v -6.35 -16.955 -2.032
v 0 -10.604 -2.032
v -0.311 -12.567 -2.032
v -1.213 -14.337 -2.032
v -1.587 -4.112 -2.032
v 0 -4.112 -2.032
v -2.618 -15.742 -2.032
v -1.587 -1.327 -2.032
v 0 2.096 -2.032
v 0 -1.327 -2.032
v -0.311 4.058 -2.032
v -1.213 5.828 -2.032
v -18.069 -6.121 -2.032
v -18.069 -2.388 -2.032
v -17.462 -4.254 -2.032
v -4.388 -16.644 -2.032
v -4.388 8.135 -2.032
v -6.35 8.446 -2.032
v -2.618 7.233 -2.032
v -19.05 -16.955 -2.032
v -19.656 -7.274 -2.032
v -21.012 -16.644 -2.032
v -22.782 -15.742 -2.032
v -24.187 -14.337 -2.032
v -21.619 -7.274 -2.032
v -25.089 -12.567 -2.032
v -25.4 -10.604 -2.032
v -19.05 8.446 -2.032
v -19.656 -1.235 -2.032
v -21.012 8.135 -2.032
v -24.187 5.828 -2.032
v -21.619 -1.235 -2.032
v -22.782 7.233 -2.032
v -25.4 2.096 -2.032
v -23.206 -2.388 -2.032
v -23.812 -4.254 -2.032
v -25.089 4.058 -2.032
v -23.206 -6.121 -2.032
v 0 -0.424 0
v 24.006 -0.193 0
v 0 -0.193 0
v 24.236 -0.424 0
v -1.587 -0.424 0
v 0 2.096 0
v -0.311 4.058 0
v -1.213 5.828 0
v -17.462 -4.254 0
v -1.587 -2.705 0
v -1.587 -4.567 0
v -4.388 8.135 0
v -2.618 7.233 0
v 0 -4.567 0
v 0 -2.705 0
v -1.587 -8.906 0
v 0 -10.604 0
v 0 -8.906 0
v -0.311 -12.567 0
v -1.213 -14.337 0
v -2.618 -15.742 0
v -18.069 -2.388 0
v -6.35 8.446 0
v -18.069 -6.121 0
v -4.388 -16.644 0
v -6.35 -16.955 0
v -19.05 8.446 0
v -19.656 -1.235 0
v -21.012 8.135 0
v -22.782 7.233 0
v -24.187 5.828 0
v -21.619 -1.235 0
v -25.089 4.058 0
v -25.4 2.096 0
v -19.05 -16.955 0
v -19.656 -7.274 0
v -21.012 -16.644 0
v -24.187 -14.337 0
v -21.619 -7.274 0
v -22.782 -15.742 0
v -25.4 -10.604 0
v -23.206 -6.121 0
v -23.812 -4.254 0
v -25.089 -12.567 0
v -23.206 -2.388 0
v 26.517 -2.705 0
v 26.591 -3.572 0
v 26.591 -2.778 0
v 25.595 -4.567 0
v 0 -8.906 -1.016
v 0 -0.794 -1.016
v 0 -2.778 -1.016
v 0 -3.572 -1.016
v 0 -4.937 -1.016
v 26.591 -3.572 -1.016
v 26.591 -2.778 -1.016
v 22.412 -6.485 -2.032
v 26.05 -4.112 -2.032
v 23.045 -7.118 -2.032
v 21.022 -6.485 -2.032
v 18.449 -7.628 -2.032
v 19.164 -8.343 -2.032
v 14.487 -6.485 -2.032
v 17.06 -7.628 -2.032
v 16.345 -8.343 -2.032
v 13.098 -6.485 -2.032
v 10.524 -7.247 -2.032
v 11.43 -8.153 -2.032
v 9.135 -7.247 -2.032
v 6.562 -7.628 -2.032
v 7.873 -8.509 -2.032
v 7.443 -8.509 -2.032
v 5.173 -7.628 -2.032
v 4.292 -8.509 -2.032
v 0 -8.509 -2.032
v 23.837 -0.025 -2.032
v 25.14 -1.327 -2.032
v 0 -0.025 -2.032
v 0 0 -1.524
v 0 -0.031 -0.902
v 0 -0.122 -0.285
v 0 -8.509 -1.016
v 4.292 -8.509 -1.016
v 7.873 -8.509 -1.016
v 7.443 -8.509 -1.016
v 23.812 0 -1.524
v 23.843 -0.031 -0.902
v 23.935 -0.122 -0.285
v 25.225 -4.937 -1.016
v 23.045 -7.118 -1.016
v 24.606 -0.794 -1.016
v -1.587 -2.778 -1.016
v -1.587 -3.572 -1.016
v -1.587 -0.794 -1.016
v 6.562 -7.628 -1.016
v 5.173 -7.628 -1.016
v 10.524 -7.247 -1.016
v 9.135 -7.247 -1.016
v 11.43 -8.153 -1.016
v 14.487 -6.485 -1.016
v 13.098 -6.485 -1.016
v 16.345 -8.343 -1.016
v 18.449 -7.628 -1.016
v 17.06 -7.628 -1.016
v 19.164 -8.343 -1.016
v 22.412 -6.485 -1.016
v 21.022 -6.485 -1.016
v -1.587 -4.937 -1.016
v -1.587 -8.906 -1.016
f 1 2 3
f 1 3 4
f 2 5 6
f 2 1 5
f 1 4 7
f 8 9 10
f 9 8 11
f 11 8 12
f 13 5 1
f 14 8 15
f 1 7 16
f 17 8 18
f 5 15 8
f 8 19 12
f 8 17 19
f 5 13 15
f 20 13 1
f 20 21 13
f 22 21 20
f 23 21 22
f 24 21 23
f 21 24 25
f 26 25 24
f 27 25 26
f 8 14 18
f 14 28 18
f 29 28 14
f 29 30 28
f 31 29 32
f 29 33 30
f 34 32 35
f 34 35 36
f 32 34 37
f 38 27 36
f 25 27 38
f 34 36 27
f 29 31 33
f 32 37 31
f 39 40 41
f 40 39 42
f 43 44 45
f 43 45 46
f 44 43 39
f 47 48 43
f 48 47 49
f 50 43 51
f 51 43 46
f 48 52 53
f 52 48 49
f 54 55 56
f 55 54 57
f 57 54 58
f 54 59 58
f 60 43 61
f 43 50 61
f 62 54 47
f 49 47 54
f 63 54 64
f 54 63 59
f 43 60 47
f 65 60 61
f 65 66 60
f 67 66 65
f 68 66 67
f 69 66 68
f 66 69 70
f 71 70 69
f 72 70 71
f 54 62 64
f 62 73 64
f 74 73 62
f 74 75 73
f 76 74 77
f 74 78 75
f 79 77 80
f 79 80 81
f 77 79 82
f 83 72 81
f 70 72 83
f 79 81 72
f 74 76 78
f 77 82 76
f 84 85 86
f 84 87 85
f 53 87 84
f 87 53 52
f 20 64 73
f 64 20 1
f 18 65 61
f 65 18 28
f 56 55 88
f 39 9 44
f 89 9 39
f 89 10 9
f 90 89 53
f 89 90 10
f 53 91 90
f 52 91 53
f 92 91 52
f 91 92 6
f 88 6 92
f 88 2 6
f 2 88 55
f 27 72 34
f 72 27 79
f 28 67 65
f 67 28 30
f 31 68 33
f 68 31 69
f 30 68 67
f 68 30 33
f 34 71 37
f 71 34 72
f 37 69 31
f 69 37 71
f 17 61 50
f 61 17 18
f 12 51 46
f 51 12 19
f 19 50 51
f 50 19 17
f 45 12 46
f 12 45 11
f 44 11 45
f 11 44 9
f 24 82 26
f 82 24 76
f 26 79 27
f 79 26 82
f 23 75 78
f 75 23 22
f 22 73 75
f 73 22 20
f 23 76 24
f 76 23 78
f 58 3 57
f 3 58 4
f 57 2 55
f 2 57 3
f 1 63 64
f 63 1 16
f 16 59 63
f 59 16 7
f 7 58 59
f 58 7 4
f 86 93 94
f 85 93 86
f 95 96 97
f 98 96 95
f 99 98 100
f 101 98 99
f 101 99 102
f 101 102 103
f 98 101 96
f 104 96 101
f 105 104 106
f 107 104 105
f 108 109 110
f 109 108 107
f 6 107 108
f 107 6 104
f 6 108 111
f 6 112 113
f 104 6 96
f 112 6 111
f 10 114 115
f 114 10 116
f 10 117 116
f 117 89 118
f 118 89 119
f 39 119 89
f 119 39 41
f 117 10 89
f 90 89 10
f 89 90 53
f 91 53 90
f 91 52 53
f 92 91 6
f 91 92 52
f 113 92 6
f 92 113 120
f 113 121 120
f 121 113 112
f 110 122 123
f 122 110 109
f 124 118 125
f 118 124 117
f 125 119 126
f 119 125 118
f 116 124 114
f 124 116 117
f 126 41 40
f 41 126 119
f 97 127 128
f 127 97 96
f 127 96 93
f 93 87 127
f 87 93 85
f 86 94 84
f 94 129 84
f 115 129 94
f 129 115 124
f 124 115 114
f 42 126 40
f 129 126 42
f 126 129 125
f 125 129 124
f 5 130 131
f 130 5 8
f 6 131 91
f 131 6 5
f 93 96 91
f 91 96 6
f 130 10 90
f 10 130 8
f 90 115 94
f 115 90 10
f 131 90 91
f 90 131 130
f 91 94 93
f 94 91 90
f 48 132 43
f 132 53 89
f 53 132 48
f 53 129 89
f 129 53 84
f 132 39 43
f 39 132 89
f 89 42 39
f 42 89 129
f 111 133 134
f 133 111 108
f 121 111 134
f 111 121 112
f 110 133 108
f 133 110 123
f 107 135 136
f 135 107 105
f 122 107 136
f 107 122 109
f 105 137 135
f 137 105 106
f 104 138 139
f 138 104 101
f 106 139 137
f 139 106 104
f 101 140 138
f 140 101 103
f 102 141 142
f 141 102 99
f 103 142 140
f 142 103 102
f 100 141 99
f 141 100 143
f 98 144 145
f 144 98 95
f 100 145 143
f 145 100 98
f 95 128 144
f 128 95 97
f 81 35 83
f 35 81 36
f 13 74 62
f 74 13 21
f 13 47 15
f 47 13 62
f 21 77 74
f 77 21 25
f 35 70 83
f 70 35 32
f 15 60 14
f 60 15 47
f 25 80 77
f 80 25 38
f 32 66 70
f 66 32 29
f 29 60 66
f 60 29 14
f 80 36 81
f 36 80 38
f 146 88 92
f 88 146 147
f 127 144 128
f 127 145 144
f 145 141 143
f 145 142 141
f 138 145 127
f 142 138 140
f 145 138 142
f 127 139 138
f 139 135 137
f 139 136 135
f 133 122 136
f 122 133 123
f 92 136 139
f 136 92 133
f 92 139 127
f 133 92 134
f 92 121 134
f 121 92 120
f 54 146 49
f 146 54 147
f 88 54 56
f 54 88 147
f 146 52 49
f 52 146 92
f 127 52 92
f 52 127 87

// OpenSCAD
// Physical Keygen - by Nirav Patel <http://eclecti.cc>
//
// Generate a duplicate of a Schlage SC1 key by editing the last line of the file
// and entering in the key code of the lock.  If you don't know the key code,
// you can measure the key and compare the numbers at:
// http://web.archive.org/web/20050217020917fw_/http://dlaco.com/spacing/tips.htm
//
// This work is licensed under a Creative Commons Attribution 3.0 Unported License.

// Since the keys and locks I have were all designed in imperial units, the
// constants in this file will be defined in inches.  The mm function
// allows us to retain the proper size for exporting a metric STL.
function mm(i) = i*25.4;

module rounded(size, r) {
    union() {
        translate([r, 0, 0]) cube([size[0]-2*r, size[1], size[2]]);
        translate([0, r, 0]) cube([size[0], size[1]-2*r, size[2]]);
        translate([r, r, 0]) cylinder(h=size[2], r=r);
        translate([size[0]-r, r, 0]) cylinder(h=size[2], r=r);
        translate([r, size[1]-r, 0]) cylinder(h=size[2], r=r);
        translate([size[0]-r, size[1]-r, 0]) cylinder(h=size[2], r=r);
    }
}

module bit() {
    w = mm(1/4);
    difference() {
        translate([-w/2, 0, 0]) cube([w, mm(1), w]);
        translate([-mm(7/256), 0, 0]) rotate([0, 0, 135]) cube([w, w, w]);
         translate([mm(7/256), 0, 0]) rotate([0, 0, -45]) cube([w, w, w]);
    }
}

// Schlage SC1 5 pin key.  The measurements are mostly guesses based on reverse
// engineering some keys I have and some publicly available information.
module sc1(bits) {
    // You may need to adjust these to fit your specific printer settings
    thickness = mm(0.080);
    length = mm(17/16);
    width = mm(.335);
    
    shoulder = mm(.231);
    pin_spacing = mm(.156);
    depth_inc = mm(.015);
    
    // A fudge factor.  Printing with your average RepRap, the bottom layer is
    // going to be squeezed larger than you want. You can make the pins
    // go slighly deeper by a fudge amount to make up for it if you aren't
    // adjusting for it elsewhere like Skeinforge or in your firmware.
    // 0.5mm works well for me.
    fudge = 0.5;
    
    // Handle size
    h_l = mm(1);
    h_w = mm(1);
    h_d = mm(1/16);
    difference() {
        // blade and key handle
        union() {
            translate([-h_l, -h_w/2 + width/2, 0]) rounded([h_l, h_w, thickness], mm(1/4));
            intersection() {
                // cut a little off the tip to avoid going too long
                cube([length - mm(1/64), width, thickness]);
                translate([0, mm(1/4), thickness*3/4]) rotate([0, 90, 0]) cylinder(h=length, r=mm(1/4), $fn=64);
            }
        }
        
        // chamfer the tip
        translate([length, mm(1/8), 0]) {
            rotate([0, 0, 45]) cube([10, 10, thickness]);
            rotate([0, 0, 225]) cube([10, 10, thickness]);
        }
        
        // put in a hole for keychain use
        translate([-h_l + mm(3/16), width/2, 0]) cylinder(h=thickness, r=mm(1/8));
        
        // cut the channels in the key.  designed more for printability than accuracy
        union() {
            translate([-h_d, mm(9/64), thickness/2]) rotate([62, 0, 0]) cube([length + h_d, width, width]);
            translate([-h_d, mm(7/64), thickness/2]) rotate([55, 0, 0]) cube([length + h_d, width, width]);
            translate([-h_d, mm(7/64), thickness/2]) cube([length + h_d, mm(1/32), width]);
        }
        
        translate([-h_d, width - mm(9/64), 0]) cube([length + h_d, width - (width - mm(10/64)), thickness/2]);
        translate([-h_d, width - mm(9/64), thickness/2]) rotate([-110, 0, 0]) cube([length + h_d, width, thickness/2]);
        
        intersection() {
            translate([-h_d, mm(1/32), thickness/2]) rotate([-118, 0, 0]) cube([length + h_d, width, width]);
            translate([-h_d, mm(1/32), thickness/2]) rotate([-110, 0, 0]) cube([length + h_d, width, width]);
        }
        
        // Do the actual bitting
        for (b = [0:4]) {
            translate([shoulder + b*pin_spacing, width - bits[b]*depth_inc - fudge, 0]) bit();
        }
    }
}

// This sample key goes to a lock that is sitting disassembled on my desk
// Flip the key over for easy printing
rotate([180, 0, 0]) sc1([1,2,4,1,4]);
